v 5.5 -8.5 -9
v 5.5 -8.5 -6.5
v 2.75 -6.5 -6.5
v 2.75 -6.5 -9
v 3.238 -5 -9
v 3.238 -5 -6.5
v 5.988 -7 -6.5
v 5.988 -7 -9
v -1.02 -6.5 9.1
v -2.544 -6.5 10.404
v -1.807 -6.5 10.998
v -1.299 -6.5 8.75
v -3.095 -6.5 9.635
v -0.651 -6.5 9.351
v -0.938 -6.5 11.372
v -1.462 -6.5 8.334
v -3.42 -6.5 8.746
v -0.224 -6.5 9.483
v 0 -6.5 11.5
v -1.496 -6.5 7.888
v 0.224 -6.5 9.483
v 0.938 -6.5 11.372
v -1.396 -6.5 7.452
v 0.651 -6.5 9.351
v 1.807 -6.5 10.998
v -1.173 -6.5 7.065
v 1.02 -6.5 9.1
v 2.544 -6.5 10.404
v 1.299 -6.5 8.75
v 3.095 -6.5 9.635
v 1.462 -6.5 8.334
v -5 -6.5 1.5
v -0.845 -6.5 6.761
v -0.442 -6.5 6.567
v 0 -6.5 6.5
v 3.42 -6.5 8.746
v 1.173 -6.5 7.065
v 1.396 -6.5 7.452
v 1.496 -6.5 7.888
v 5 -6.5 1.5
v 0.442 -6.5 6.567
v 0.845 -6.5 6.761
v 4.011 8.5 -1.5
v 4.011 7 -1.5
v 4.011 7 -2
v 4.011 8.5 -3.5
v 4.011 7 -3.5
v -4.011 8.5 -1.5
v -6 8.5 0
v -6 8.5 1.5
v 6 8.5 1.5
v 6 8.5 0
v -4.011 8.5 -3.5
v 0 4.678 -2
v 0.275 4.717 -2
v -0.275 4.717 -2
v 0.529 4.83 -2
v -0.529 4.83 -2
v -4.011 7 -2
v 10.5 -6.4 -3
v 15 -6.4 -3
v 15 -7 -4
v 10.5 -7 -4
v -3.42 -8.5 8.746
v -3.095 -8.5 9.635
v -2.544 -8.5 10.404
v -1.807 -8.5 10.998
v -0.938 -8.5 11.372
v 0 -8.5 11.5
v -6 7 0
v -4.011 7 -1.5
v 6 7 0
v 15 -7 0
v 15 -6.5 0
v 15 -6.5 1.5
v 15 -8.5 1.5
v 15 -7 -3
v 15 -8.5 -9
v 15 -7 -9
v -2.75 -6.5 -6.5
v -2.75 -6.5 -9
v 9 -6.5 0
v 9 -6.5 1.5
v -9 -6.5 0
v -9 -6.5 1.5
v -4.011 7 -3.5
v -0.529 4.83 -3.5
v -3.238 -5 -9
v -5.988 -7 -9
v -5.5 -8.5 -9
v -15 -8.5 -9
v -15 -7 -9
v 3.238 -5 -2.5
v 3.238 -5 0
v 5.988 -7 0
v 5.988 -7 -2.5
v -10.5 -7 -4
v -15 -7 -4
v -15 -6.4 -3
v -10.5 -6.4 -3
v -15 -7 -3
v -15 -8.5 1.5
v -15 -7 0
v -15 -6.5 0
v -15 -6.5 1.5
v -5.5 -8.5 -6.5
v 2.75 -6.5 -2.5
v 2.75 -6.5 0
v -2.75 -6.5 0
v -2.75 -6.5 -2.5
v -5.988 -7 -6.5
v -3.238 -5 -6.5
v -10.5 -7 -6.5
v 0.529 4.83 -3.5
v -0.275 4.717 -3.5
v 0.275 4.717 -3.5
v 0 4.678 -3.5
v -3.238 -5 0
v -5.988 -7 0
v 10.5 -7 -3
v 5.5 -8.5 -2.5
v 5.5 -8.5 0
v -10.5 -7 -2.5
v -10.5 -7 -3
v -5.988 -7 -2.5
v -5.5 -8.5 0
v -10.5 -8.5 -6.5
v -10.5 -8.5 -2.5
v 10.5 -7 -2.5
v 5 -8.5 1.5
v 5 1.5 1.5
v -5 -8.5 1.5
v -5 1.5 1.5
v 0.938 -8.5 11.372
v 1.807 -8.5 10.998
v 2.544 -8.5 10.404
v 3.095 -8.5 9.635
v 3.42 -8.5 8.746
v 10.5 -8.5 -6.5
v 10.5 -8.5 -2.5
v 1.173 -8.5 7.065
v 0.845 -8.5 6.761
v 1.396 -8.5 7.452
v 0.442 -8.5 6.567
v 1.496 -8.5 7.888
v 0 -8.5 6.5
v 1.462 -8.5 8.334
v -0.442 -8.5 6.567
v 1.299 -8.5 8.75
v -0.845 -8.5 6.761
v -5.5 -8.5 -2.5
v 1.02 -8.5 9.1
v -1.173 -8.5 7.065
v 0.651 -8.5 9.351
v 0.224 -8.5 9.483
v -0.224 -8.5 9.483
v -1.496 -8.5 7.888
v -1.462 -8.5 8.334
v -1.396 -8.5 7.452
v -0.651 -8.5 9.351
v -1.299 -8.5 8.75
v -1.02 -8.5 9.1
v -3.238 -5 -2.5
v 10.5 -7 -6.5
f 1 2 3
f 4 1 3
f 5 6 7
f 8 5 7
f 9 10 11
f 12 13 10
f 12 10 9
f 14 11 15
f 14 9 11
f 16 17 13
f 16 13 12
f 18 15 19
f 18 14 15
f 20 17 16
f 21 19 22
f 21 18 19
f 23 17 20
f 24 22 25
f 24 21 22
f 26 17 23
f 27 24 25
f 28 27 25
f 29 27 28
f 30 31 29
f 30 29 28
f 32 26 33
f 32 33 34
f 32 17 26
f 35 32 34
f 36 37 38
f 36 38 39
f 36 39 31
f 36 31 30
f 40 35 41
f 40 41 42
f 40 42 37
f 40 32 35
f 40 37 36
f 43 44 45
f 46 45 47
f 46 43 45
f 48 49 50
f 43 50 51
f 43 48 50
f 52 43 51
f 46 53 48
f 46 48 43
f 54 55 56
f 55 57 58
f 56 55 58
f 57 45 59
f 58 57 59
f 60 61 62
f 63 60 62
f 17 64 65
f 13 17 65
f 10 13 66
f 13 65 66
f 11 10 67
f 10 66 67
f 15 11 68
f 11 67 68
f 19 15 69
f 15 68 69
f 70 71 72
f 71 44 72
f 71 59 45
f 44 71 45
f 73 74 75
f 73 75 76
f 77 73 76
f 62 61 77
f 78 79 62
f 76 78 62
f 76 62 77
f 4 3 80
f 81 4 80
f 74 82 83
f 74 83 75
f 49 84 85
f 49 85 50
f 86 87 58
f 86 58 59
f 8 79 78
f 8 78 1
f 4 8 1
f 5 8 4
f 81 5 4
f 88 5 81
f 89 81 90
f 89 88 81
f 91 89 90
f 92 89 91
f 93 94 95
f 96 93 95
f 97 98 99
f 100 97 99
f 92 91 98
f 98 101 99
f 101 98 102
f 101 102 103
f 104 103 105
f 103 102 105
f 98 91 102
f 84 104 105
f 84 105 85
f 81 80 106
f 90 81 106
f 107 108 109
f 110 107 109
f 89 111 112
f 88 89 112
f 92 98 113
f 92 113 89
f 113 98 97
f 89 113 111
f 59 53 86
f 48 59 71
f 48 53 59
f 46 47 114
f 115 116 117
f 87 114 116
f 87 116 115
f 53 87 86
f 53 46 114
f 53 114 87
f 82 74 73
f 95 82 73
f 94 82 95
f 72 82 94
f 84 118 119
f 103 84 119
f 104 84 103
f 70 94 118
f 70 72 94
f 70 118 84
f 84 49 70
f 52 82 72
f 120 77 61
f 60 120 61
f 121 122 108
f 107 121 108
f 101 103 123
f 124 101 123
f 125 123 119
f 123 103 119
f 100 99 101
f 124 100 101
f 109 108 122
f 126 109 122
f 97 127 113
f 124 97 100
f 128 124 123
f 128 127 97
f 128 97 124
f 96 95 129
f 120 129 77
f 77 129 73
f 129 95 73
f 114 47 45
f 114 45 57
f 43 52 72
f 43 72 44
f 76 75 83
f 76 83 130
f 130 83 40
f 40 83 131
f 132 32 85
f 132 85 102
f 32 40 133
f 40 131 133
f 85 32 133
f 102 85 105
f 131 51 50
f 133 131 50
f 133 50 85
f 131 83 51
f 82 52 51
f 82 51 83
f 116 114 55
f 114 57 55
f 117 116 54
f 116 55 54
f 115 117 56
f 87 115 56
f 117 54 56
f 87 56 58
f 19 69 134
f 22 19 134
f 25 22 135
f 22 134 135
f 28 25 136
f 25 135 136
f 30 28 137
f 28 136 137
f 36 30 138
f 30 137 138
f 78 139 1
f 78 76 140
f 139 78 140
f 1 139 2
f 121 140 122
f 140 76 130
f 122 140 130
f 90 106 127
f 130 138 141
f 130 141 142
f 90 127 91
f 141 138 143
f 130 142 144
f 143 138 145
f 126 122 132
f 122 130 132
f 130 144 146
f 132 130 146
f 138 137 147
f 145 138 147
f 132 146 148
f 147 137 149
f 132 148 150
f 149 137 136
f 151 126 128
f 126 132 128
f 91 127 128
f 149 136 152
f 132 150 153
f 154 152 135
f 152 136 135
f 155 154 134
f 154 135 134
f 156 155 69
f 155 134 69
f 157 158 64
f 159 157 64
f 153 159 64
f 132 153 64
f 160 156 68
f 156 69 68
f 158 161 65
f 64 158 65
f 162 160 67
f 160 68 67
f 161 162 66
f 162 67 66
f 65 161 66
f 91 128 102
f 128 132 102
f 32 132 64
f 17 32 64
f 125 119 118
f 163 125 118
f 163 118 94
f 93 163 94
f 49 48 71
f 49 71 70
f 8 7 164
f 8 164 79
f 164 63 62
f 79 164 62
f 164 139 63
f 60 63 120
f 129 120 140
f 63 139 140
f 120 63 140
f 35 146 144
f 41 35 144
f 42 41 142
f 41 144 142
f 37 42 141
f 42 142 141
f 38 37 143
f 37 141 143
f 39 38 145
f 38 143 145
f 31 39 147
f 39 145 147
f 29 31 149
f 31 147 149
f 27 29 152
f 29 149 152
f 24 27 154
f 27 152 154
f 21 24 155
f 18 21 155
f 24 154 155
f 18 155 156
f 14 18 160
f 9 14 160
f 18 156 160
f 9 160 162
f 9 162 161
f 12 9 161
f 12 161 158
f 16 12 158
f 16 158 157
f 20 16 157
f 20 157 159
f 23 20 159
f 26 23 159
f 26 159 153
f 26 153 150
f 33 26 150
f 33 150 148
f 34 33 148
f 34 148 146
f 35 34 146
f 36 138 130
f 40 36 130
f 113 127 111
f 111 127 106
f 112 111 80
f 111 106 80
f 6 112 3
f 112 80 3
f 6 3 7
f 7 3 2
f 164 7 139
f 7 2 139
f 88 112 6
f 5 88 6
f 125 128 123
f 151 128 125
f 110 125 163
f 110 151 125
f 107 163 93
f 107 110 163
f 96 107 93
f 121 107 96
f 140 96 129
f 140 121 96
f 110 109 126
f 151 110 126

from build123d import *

# Parameters (mm, degrees)
SALIENTE_EXTRUIR1_DEPTH = 1.5
CROQUIS2_W              = 10
CROQUIS2_H              = 2
SALIENTE_EXTRUIR2_DEPTH = 10
CROQUIS3_R              = 1.5
CORTAR_EXTRUIR1_DEPTH   = 10
SALIENTE_EXTRUIR5_DEPTH = 1.5
SALIENTE_EXTRUIR6_DEPTH = 1.5
REDONDEO2_R             = 1
SALIENTE_EXTRUIR7_DEPTH = 9
CORTAR_EXTRUIR2_REACH   = 27.421
CROQUIS8_W              = 21
CROQUIS8_H              = 4
SALIENTE_EXTRUIR8_DEPTH = 4.5
SALIENTE_EXTRUIR9_DEPTH = 4.5


with BuildPart() as part:
    # Croquis1 → Saliente-Extruir1 (new body)
    with BuildSketch(Plane.XY):
        Polygon((-6, 8.5), (6, 8.5), (9, -6.5), (15, -6.5), (15, -8.5), (-15, -8.5), (-15, -6.5), (-9, -6.5), align=None)
    extrude(amount=SALIENTE_EXTRUIR1_DEPTH)

    # Croquis2 → Saliente-Extruir2 (add)
    with BuildSketch(Plane.XY.offset(1.5)):
        with Locations((0, -7.5)):
            Rectangle(CROQUIS2_W, CROQUIS2_H)
    extrude(amount=SALIENTE_EXTRUIR2_DEPTH)

    # Croquis3 → Cortar-Extruir1 (cut)
    with BuildSketch(Plane.XZ.offset(8.5)):
        with BuildLine():
            Line((-5, 11.5), (-5, 1.5))
            Line((-5, 1.5), (-3.41960618, 8.745850907))
            ThreePointArc((-3.41960618, 8.745850907), (-2.195395389, 10.72584649), (0, 11.5))
            Line((0, 11.5), (-5, 11.5))
        make_face()
        with BuildLine():
            Line((5, 11.5), (0, 11.5))
            ThreePointArc((0, 11.5), (2.195395389, 10.72584649), (3.41960618, 8.745850907))
            Line((3.41960618, 8.745850907), (5, 1.5))
            Line((5, 1.5), (5, 11.5))
        make_face()
        with Locations(Location((0, 8, 0), (0, 0, 270))):
            Circle(CROQUIS3_R)
    extrude(amount=-CORTAR_EXTRUIR1_DEPTH, mode=Mode.SUBTRACT)

    # Croquis4 → Saliente-Extruir5 (add)
    with BuildSketch(Plane(origin=(0, 8.5, 0), x_dir=(1, 0, 0), z_dir=(0, 1, 0))):
        Polygon((6, 0), (4.010944544, 1.5), (4.010944544, 3.5), (-4.010944544, 3.5), (-4.010944544, 1.5), (-6, 0), align=None)
    extrude(amount=-SALIENTE_EXTRUIR5_DEPTH)

    # Croquis6 → Saliente-Extruir6 (add)
    with BuildSketch(Plane(origin=(0, 0, -3.5), x_dir=(-1, 0, 0), z_dir=(0, 0, -1))):
        Polygon((-4.010944544, 7), (0, 4.5), (4.010944544, 7), align=None)
    extrude(amount=-SALIENTE_EXTRUIR6_DEPTH)

    # Redondeo2
    redondeo2_edges = [part.edges().sort_by_distance(p)[0] for p in [
        (0, 4.5, -2.75),
    ]]
    fillet(redondeo2_edges, radius=REDONDEO2_R)

    # Croquis7 → Saliente-Extruir7 (add)
    with BuildSketch(Plane(origin=(0, 0, 0), x_dir=(-1, 0, 0), z_dir=(0, 0, -1))):
        Polygon((5.5, -8.5), (15, -8.5), (15, -7), (5.98777572, -7), (3.23777572, -5), (-3.23777572, -5), (-5.98777572, -7), (-15, -7), (-15, -8.5), (-5.5, -8.5), (-2.75, -6.5), (2.75, -6.5), align=None)
    extrude(amount=SALIENTE_EXTRUIR7_DEPTH)

    # Croquis8 → Cortar-Extruir2 (cut, up to next)
    with BuildSketch(Plane.XZ.offset(8.5), mode=Mode.PRIVATE) as cortar_extruir2_sk1:
        with Locations((0, -4.5)):
            Rectangle(CROQUIS8_W, CROQUIS8_H)
    cortar_extruir2_tool1 = extrude(cortar_extruir2_sk1.sketch, amount=-CORTAR_EXTRUIR2_REACH, mode=Mode.PRIVATE) & part.part
    add(cortar_extruir2_tool1.solids().sort_by_distance((0, -8.5, -4.5))[0], mode=Mode.SUBTRACT)

    # Croquis9 → Saliente-Extruir8 (add)
    with BuildSketch(Plane(origin=(15, 0, 0), x_dir=(0, 0, -1), z_dir=(1, 0, 0))):
        Polygon((3, -7), (3, -6.4), (4, -7), align=None)
    extrude(amount=-SALIENTE_EXTRUIR8_DEPTH)

    # Croquis10 → Saliente-Extruir9 (add)
    with BuildSketch(Plane.ZY.offset(15)):
        Polygon((-3, -6.4), (-3, -7), (-4, -7), align=None)
    extrude(amount=-SALIENTE_EXTRUIR9_DEPTH)


solid = part.part
